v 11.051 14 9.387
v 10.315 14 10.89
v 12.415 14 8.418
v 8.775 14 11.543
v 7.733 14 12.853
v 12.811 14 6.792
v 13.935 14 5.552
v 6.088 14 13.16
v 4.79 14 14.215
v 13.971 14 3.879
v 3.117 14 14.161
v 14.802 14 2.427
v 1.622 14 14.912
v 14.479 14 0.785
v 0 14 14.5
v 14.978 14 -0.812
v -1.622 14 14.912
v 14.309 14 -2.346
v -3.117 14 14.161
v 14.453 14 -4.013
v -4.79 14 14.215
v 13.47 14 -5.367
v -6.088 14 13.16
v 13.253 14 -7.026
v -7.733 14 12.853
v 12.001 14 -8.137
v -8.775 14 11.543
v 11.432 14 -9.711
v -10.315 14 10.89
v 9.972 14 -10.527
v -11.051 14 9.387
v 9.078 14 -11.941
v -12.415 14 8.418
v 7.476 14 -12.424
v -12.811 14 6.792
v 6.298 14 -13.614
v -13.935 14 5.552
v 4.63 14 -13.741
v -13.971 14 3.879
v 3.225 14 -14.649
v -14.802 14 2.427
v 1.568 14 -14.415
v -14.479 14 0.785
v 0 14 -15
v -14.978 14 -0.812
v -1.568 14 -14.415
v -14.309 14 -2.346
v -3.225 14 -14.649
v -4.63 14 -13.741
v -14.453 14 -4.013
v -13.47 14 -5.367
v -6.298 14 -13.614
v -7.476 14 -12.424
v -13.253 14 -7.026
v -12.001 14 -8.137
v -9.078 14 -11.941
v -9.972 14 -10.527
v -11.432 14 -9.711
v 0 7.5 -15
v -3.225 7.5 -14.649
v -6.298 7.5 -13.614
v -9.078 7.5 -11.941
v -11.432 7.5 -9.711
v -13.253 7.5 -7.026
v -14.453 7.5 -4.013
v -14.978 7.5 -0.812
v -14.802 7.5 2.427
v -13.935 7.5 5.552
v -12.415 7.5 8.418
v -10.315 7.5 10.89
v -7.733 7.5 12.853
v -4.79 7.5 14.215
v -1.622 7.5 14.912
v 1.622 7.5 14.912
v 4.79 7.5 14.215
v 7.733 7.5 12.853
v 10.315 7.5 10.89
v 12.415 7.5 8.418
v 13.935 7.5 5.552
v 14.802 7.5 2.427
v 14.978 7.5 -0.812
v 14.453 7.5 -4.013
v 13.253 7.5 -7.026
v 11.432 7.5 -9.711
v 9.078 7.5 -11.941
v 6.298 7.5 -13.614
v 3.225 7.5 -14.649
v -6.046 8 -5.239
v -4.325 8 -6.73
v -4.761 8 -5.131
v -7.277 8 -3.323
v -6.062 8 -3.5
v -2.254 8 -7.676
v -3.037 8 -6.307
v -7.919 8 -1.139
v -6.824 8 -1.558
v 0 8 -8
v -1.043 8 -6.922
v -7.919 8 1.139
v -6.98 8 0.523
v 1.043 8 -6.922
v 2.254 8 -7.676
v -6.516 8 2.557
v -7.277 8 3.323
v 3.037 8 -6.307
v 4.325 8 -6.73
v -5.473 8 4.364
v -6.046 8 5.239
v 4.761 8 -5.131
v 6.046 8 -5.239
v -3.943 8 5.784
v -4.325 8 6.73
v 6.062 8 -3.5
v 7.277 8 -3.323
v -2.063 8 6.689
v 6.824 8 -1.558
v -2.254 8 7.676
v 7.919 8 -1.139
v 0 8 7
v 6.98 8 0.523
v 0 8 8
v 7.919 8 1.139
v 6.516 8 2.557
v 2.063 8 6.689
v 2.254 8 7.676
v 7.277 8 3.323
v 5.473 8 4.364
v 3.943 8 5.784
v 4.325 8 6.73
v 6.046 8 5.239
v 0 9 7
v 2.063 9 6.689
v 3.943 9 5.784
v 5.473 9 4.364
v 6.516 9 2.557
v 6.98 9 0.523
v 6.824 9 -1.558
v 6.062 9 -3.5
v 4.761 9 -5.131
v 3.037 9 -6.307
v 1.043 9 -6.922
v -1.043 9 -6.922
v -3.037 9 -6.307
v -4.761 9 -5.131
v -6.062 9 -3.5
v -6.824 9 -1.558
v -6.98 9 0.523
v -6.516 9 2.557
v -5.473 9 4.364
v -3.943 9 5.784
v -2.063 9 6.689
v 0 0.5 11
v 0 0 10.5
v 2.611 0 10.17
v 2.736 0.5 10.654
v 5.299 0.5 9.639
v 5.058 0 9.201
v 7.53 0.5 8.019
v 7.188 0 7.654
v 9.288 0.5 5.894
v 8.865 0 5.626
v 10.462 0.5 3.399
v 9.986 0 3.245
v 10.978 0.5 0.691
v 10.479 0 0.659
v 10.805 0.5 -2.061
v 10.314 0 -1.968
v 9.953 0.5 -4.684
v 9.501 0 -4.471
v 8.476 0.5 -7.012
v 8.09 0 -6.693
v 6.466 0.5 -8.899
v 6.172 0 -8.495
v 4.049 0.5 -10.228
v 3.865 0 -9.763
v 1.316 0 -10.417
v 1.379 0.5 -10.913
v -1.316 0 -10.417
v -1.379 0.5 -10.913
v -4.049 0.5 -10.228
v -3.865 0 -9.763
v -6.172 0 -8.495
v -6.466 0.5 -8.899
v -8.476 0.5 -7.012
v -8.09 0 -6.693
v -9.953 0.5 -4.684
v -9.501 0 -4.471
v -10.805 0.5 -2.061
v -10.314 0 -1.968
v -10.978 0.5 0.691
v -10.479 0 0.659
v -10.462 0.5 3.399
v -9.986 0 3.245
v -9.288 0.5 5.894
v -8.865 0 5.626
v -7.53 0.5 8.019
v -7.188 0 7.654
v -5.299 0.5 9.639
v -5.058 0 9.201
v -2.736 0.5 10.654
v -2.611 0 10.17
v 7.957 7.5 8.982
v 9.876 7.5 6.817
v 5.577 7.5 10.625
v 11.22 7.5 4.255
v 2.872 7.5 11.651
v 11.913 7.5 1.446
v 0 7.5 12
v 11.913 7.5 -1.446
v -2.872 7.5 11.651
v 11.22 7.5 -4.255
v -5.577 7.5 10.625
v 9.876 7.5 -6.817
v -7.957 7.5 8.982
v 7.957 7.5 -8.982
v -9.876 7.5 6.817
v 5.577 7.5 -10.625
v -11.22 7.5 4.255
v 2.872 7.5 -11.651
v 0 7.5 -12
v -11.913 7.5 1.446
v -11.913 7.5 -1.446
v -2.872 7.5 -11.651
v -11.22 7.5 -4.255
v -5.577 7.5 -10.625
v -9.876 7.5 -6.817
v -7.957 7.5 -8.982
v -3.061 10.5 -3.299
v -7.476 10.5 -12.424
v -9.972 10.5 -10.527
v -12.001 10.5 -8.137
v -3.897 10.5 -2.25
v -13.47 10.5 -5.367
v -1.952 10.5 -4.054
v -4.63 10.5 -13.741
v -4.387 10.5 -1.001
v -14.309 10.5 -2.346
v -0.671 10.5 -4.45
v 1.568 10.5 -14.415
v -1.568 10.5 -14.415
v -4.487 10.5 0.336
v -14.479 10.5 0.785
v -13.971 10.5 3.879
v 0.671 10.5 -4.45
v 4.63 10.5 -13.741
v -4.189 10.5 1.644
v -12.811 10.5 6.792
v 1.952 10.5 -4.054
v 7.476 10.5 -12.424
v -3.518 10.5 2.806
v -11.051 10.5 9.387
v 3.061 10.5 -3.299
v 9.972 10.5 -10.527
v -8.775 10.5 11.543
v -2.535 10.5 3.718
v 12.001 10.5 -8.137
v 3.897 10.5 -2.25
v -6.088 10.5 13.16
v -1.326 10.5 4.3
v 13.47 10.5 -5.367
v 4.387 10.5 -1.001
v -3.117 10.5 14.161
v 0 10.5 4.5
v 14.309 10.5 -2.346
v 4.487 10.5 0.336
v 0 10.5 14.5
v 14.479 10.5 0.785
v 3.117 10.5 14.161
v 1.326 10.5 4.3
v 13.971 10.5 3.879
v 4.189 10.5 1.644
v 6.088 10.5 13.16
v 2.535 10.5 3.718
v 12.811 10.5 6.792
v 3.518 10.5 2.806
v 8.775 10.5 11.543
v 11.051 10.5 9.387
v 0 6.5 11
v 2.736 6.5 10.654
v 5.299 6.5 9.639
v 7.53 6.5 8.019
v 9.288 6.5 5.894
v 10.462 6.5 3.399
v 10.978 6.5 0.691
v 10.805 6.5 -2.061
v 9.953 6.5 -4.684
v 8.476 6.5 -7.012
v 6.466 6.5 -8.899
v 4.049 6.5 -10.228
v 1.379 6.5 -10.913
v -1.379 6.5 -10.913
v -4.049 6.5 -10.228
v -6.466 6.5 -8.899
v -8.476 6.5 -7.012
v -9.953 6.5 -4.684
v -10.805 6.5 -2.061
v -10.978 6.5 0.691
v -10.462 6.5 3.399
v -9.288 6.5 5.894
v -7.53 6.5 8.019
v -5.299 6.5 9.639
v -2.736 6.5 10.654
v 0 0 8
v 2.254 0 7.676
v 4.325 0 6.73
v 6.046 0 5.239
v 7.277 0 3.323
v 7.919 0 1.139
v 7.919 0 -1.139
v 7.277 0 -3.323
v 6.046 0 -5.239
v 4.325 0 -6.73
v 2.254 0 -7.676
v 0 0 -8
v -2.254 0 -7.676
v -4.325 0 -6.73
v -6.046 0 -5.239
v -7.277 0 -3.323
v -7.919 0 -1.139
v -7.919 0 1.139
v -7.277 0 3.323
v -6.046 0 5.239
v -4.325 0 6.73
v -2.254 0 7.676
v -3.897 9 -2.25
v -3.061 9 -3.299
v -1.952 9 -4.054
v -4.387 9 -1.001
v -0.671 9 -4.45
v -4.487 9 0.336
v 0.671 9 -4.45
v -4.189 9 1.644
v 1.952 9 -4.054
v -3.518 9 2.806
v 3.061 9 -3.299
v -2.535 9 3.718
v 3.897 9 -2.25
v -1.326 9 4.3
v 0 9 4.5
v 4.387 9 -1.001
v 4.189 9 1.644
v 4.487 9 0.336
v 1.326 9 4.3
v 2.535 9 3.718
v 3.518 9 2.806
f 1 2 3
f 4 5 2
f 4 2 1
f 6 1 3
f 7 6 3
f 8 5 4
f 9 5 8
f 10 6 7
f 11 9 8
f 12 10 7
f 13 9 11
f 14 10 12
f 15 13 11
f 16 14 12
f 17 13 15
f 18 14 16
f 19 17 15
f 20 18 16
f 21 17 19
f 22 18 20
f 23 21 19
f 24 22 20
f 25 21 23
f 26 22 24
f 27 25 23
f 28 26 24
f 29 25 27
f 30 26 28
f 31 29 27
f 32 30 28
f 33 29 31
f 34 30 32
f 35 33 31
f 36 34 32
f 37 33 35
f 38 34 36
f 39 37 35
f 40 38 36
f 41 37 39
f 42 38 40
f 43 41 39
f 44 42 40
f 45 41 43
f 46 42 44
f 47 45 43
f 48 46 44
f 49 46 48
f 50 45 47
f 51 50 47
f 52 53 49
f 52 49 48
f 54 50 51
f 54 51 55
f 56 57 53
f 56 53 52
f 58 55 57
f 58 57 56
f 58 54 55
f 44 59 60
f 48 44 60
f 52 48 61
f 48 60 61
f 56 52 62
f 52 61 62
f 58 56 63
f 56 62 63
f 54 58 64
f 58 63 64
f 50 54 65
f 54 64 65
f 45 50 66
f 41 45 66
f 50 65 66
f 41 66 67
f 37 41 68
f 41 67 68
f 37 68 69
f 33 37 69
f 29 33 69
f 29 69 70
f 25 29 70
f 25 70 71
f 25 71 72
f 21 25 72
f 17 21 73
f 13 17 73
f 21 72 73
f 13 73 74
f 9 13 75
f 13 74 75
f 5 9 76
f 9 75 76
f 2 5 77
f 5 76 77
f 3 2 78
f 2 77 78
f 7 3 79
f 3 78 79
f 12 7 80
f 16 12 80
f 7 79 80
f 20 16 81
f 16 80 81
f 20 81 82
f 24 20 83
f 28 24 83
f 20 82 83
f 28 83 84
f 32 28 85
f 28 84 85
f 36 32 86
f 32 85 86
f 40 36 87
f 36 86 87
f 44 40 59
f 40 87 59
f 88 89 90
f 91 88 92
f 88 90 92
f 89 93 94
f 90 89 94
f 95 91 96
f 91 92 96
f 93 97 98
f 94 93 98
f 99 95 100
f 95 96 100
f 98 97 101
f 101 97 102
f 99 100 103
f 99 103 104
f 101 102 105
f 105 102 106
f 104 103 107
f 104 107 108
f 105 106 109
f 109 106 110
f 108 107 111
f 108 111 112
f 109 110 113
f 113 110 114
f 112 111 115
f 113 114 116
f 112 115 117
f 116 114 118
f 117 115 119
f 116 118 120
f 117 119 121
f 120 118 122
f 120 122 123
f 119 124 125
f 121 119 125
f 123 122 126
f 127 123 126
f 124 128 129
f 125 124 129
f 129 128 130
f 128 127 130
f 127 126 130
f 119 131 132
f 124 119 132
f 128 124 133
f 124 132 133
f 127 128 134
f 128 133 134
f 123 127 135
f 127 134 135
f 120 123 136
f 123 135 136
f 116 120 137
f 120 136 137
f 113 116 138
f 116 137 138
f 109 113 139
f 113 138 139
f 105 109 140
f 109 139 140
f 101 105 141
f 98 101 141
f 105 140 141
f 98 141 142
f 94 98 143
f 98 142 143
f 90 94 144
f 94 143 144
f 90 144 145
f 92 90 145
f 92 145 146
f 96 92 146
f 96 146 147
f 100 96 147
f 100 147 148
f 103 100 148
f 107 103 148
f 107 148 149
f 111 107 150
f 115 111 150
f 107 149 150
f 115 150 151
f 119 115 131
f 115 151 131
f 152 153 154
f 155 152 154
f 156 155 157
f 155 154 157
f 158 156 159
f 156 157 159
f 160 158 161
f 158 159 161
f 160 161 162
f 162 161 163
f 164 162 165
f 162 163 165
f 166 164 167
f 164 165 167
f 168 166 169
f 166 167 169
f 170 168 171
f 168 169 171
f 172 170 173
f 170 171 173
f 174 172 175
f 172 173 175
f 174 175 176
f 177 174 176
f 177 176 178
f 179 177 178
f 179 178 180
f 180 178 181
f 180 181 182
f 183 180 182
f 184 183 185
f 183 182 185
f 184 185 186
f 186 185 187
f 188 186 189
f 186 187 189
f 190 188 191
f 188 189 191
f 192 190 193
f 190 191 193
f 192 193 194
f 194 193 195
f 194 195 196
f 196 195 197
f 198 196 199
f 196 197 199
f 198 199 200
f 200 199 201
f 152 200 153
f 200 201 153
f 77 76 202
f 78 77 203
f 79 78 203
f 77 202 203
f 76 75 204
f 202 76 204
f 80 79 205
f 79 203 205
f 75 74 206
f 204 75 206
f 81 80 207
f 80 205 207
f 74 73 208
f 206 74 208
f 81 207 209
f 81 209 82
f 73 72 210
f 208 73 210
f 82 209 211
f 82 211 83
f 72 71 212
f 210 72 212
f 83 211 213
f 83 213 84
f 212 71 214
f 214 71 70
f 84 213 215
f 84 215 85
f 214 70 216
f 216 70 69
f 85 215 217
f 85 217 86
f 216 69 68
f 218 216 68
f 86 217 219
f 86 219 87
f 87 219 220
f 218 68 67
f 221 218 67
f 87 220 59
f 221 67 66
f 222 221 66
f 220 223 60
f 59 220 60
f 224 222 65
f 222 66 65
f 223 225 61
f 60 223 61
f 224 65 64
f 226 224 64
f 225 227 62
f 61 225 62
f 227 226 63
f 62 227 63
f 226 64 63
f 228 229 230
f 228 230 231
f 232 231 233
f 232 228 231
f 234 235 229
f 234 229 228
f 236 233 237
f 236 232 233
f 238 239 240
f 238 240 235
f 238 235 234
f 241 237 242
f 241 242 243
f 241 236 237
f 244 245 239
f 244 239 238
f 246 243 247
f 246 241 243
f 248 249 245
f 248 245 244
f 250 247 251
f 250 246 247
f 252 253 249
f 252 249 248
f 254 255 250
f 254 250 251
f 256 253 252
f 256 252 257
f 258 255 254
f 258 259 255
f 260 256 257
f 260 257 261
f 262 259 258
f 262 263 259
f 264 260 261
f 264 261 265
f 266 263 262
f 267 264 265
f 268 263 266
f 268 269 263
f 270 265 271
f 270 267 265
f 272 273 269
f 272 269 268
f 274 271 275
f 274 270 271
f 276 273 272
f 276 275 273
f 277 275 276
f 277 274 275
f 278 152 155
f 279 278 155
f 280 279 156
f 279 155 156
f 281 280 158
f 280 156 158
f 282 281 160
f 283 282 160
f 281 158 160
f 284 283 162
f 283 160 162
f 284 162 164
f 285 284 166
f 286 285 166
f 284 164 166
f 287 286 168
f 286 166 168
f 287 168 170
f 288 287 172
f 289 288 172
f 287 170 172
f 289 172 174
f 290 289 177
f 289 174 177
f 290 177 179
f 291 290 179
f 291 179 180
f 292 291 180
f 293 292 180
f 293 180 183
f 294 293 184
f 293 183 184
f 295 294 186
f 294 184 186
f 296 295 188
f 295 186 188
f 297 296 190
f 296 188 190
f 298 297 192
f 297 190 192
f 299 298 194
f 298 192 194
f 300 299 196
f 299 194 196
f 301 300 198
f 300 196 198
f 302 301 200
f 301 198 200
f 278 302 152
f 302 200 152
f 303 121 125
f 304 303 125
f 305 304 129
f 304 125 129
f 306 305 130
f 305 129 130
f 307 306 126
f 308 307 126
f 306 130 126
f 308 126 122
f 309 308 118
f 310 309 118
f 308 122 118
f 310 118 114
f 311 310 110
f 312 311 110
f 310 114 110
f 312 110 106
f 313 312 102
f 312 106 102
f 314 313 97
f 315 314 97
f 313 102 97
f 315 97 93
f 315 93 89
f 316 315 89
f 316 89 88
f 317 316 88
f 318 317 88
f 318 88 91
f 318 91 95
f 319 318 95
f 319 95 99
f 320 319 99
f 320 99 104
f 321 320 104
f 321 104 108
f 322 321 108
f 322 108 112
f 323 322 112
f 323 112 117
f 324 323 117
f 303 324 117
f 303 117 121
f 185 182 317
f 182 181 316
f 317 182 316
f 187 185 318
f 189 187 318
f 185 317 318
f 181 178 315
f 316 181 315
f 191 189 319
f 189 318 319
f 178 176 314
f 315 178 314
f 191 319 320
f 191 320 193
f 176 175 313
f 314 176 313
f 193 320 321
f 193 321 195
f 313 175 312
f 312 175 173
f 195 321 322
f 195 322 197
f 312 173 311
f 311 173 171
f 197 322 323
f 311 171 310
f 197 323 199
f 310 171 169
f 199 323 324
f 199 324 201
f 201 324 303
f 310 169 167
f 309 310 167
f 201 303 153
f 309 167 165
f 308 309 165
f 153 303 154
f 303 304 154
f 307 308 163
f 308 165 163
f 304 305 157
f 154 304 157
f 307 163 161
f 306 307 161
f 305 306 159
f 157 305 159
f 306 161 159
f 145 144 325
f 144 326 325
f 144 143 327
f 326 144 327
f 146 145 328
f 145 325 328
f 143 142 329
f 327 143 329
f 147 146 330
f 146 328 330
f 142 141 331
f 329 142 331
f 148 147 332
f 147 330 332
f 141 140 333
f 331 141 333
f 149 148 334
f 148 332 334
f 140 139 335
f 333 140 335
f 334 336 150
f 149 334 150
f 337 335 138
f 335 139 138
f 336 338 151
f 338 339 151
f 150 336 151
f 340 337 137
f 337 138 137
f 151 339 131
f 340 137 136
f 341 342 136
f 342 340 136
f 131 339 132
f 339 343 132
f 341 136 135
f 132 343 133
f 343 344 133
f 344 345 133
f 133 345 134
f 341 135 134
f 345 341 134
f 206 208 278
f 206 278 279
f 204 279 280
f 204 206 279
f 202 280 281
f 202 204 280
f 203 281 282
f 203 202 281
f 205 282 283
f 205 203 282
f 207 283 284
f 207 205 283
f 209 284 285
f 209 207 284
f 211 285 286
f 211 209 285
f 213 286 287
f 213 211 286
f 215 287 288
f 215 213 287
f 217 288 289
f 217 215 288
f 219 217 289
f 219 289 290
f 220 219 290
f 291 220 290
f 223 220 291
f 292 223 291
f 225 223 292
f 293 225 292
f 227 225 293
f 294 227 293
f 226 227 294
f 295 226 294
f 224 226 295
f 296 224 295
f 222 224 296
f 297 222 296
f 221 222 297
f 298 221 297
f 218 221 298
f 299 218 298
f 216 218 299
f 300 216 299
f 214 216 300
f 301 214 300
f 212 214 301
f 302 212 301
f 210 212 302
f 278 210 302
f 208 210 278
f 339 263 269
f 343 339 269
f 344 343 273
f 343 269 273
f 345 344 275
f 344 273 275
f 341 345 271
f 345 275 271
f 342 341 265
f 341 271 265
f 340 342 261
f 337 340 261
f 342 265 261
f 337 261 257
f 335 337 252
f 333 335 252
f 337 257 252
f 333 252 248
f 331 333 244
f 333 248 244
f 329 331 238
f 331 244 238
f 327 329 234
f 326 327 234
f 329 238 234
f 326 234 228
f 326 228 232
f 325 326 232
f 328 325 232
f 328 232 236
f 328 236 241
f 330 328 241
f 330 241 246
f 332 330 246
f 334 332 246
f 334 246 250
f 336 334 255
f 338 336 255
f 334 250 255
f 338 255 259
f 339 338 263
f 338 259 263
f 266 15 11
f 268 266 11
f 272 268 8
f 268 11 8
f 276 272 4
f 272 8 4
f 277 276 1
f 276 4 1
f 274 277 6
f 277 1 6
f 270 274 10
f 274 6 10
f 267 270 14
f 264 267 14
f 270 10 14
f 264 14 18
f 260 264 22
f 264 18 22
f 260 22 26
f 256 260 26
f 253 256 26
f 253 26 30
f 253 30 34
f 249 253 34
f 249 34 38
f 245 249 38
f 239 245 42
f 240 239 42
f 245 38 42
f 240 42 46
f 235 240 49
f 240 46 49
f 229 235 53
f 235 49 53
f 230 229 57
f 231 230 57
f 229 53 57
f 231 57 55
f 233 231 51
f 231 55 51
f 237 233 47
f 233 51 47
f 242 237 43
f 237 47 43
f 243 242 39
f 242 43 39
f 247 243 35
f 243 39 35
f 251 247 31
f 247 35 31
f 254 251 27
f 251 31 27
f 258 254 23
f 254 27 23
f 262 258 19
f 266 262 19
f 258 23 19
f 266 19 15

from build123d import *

# Parameters (mm, degrees)
ESQUISSE1_R             = 11
BOSS_EXTRU_1_DEPTH      = 7.5
ESQUISSE3_R             = 15
BOSS_EXTRU_2_DEPTH      = 6.5
CHANFREIN1_SIZE         = 0.5
CHANFREIN2_SIZE         = 1
ESQUISSE4_R             = 14.5
ENL_V_MAT_EXTRU_1_DEPTH = 3.5
ESQUISSE5_R             = 4.5
ENL_V_MAT_EXTRU_2_DEPTH = 1.5
ESQUISSE6_R             = 7
ENL_V_MAT_EXTRU_3_DEPTH = 1
ESQUISSE8_R             = 8
ENL_V_MAT_EXTRU_4_DEPTH = 23.671568098


with BuildPart() as part:
    # Esquisse1 → Boss.-Extru.1 (new body)
    with BuildSketch(Plane(origin=(0, 0, 0), x_dir=(1, 0, 0), z_dir=(0, 1, 0))):
        with Locations(Location((0, 0, 0), (0, 0, 270))):
            Circle(ESQUISSE1_R)
    extrude(amount=BOSS_EXTRU_1_DEPTH)

    # Esquisse3 → Boss.-Extru.2 (add)
    with BuildSketch(Plane(origin=(0, 7.5, 0), x_dir=(1, 0, 0), z_dir=(0, 1, 0))):
        with Locations(Location((0, 0, 0), (0, 0, 90))):
            Circle(ESQUISSE3_R)
    extrude(amount=BOSS_EXTRU_2_DEPTH)

    # Chanfrein1
    chanfrein1_edges = [part.edges().sort_by_distance(p)[0] for p in [
        (0, 0, -11),
    ]]
    chamfer(chanfrein1_edges, length=CHANFREIN1_SIZE)

    # Chanfrein2
    chanfrein2_edges = [part.edges().sort_by_distance(p)[0] for p in [
        (0, 7.5, -11),
    ]]
    chamfer(chanfrein2_edges, length=CHANFREIN2_SIZE)

    # Esquisse4 → Enlèv. mat.-Extru.1 (cut)
    with BuildSketch(Plane(origin=(0, 14, 0), x_dir=(1, 0, 0), z_dir=(0, 1, 0))):
        with Locations(Location((0, 0, 0), (0, 0, 270))):
            Circle(ESQUISSE4_R)
    extrude(amount=-ENL_V_MAT_EXTRU_1_DEPTH, mode=Mode.SUBTRACT)

    # Esquisse5 → Enlèv. mat.-Extru.2 (cut)
    with BuildSketch(Plane(origin=(0, 10.5, 0), x_dir=(1, 0, 0), z_dir=(0, 1, 0))):
        with Locations(Location((0, 0, 0), (0, 0, 270))):
            Circle(ESQUISSE5_R)
    extrude(amount=-ENL_V_MAT_EXTRU_2_DEPTH, mode=Mode.SUBTRACT)

    # Esquisse6 → Enlèv. mat.-Extru.3 (cut)
    with BuildSketch(Plane(origin=(0, 9, 0), x_dir=(1, 0, 0), z_dir=(0, 1, 0))):
        with Locations(Location((0, 0, 0), (0, 0, 270))):
            Circle(ESQUISSE6_R)
    extrude(amount=-ENL_V_MAT_EXTRU_3_DEPTH, mode=Mode.SUBTRACT)

    # Esquisse8 → Enlèv. mat.-Extru.4 (cut, through all)
    with BuildSketch(Plane(origin=(0, 8, 0), x_dir=(1, 0, 0), z_dir=(0, 1, 0))):
        with Locations(Location((0, 0, 0), (0, 0, 270))):
            Circle(ESQUISSE8_R)
    extrude(amount=-ENL_V_MAT_EXTRU_4_DEPTH, mode=Mode.SUBTRACT)


solid = part.part
